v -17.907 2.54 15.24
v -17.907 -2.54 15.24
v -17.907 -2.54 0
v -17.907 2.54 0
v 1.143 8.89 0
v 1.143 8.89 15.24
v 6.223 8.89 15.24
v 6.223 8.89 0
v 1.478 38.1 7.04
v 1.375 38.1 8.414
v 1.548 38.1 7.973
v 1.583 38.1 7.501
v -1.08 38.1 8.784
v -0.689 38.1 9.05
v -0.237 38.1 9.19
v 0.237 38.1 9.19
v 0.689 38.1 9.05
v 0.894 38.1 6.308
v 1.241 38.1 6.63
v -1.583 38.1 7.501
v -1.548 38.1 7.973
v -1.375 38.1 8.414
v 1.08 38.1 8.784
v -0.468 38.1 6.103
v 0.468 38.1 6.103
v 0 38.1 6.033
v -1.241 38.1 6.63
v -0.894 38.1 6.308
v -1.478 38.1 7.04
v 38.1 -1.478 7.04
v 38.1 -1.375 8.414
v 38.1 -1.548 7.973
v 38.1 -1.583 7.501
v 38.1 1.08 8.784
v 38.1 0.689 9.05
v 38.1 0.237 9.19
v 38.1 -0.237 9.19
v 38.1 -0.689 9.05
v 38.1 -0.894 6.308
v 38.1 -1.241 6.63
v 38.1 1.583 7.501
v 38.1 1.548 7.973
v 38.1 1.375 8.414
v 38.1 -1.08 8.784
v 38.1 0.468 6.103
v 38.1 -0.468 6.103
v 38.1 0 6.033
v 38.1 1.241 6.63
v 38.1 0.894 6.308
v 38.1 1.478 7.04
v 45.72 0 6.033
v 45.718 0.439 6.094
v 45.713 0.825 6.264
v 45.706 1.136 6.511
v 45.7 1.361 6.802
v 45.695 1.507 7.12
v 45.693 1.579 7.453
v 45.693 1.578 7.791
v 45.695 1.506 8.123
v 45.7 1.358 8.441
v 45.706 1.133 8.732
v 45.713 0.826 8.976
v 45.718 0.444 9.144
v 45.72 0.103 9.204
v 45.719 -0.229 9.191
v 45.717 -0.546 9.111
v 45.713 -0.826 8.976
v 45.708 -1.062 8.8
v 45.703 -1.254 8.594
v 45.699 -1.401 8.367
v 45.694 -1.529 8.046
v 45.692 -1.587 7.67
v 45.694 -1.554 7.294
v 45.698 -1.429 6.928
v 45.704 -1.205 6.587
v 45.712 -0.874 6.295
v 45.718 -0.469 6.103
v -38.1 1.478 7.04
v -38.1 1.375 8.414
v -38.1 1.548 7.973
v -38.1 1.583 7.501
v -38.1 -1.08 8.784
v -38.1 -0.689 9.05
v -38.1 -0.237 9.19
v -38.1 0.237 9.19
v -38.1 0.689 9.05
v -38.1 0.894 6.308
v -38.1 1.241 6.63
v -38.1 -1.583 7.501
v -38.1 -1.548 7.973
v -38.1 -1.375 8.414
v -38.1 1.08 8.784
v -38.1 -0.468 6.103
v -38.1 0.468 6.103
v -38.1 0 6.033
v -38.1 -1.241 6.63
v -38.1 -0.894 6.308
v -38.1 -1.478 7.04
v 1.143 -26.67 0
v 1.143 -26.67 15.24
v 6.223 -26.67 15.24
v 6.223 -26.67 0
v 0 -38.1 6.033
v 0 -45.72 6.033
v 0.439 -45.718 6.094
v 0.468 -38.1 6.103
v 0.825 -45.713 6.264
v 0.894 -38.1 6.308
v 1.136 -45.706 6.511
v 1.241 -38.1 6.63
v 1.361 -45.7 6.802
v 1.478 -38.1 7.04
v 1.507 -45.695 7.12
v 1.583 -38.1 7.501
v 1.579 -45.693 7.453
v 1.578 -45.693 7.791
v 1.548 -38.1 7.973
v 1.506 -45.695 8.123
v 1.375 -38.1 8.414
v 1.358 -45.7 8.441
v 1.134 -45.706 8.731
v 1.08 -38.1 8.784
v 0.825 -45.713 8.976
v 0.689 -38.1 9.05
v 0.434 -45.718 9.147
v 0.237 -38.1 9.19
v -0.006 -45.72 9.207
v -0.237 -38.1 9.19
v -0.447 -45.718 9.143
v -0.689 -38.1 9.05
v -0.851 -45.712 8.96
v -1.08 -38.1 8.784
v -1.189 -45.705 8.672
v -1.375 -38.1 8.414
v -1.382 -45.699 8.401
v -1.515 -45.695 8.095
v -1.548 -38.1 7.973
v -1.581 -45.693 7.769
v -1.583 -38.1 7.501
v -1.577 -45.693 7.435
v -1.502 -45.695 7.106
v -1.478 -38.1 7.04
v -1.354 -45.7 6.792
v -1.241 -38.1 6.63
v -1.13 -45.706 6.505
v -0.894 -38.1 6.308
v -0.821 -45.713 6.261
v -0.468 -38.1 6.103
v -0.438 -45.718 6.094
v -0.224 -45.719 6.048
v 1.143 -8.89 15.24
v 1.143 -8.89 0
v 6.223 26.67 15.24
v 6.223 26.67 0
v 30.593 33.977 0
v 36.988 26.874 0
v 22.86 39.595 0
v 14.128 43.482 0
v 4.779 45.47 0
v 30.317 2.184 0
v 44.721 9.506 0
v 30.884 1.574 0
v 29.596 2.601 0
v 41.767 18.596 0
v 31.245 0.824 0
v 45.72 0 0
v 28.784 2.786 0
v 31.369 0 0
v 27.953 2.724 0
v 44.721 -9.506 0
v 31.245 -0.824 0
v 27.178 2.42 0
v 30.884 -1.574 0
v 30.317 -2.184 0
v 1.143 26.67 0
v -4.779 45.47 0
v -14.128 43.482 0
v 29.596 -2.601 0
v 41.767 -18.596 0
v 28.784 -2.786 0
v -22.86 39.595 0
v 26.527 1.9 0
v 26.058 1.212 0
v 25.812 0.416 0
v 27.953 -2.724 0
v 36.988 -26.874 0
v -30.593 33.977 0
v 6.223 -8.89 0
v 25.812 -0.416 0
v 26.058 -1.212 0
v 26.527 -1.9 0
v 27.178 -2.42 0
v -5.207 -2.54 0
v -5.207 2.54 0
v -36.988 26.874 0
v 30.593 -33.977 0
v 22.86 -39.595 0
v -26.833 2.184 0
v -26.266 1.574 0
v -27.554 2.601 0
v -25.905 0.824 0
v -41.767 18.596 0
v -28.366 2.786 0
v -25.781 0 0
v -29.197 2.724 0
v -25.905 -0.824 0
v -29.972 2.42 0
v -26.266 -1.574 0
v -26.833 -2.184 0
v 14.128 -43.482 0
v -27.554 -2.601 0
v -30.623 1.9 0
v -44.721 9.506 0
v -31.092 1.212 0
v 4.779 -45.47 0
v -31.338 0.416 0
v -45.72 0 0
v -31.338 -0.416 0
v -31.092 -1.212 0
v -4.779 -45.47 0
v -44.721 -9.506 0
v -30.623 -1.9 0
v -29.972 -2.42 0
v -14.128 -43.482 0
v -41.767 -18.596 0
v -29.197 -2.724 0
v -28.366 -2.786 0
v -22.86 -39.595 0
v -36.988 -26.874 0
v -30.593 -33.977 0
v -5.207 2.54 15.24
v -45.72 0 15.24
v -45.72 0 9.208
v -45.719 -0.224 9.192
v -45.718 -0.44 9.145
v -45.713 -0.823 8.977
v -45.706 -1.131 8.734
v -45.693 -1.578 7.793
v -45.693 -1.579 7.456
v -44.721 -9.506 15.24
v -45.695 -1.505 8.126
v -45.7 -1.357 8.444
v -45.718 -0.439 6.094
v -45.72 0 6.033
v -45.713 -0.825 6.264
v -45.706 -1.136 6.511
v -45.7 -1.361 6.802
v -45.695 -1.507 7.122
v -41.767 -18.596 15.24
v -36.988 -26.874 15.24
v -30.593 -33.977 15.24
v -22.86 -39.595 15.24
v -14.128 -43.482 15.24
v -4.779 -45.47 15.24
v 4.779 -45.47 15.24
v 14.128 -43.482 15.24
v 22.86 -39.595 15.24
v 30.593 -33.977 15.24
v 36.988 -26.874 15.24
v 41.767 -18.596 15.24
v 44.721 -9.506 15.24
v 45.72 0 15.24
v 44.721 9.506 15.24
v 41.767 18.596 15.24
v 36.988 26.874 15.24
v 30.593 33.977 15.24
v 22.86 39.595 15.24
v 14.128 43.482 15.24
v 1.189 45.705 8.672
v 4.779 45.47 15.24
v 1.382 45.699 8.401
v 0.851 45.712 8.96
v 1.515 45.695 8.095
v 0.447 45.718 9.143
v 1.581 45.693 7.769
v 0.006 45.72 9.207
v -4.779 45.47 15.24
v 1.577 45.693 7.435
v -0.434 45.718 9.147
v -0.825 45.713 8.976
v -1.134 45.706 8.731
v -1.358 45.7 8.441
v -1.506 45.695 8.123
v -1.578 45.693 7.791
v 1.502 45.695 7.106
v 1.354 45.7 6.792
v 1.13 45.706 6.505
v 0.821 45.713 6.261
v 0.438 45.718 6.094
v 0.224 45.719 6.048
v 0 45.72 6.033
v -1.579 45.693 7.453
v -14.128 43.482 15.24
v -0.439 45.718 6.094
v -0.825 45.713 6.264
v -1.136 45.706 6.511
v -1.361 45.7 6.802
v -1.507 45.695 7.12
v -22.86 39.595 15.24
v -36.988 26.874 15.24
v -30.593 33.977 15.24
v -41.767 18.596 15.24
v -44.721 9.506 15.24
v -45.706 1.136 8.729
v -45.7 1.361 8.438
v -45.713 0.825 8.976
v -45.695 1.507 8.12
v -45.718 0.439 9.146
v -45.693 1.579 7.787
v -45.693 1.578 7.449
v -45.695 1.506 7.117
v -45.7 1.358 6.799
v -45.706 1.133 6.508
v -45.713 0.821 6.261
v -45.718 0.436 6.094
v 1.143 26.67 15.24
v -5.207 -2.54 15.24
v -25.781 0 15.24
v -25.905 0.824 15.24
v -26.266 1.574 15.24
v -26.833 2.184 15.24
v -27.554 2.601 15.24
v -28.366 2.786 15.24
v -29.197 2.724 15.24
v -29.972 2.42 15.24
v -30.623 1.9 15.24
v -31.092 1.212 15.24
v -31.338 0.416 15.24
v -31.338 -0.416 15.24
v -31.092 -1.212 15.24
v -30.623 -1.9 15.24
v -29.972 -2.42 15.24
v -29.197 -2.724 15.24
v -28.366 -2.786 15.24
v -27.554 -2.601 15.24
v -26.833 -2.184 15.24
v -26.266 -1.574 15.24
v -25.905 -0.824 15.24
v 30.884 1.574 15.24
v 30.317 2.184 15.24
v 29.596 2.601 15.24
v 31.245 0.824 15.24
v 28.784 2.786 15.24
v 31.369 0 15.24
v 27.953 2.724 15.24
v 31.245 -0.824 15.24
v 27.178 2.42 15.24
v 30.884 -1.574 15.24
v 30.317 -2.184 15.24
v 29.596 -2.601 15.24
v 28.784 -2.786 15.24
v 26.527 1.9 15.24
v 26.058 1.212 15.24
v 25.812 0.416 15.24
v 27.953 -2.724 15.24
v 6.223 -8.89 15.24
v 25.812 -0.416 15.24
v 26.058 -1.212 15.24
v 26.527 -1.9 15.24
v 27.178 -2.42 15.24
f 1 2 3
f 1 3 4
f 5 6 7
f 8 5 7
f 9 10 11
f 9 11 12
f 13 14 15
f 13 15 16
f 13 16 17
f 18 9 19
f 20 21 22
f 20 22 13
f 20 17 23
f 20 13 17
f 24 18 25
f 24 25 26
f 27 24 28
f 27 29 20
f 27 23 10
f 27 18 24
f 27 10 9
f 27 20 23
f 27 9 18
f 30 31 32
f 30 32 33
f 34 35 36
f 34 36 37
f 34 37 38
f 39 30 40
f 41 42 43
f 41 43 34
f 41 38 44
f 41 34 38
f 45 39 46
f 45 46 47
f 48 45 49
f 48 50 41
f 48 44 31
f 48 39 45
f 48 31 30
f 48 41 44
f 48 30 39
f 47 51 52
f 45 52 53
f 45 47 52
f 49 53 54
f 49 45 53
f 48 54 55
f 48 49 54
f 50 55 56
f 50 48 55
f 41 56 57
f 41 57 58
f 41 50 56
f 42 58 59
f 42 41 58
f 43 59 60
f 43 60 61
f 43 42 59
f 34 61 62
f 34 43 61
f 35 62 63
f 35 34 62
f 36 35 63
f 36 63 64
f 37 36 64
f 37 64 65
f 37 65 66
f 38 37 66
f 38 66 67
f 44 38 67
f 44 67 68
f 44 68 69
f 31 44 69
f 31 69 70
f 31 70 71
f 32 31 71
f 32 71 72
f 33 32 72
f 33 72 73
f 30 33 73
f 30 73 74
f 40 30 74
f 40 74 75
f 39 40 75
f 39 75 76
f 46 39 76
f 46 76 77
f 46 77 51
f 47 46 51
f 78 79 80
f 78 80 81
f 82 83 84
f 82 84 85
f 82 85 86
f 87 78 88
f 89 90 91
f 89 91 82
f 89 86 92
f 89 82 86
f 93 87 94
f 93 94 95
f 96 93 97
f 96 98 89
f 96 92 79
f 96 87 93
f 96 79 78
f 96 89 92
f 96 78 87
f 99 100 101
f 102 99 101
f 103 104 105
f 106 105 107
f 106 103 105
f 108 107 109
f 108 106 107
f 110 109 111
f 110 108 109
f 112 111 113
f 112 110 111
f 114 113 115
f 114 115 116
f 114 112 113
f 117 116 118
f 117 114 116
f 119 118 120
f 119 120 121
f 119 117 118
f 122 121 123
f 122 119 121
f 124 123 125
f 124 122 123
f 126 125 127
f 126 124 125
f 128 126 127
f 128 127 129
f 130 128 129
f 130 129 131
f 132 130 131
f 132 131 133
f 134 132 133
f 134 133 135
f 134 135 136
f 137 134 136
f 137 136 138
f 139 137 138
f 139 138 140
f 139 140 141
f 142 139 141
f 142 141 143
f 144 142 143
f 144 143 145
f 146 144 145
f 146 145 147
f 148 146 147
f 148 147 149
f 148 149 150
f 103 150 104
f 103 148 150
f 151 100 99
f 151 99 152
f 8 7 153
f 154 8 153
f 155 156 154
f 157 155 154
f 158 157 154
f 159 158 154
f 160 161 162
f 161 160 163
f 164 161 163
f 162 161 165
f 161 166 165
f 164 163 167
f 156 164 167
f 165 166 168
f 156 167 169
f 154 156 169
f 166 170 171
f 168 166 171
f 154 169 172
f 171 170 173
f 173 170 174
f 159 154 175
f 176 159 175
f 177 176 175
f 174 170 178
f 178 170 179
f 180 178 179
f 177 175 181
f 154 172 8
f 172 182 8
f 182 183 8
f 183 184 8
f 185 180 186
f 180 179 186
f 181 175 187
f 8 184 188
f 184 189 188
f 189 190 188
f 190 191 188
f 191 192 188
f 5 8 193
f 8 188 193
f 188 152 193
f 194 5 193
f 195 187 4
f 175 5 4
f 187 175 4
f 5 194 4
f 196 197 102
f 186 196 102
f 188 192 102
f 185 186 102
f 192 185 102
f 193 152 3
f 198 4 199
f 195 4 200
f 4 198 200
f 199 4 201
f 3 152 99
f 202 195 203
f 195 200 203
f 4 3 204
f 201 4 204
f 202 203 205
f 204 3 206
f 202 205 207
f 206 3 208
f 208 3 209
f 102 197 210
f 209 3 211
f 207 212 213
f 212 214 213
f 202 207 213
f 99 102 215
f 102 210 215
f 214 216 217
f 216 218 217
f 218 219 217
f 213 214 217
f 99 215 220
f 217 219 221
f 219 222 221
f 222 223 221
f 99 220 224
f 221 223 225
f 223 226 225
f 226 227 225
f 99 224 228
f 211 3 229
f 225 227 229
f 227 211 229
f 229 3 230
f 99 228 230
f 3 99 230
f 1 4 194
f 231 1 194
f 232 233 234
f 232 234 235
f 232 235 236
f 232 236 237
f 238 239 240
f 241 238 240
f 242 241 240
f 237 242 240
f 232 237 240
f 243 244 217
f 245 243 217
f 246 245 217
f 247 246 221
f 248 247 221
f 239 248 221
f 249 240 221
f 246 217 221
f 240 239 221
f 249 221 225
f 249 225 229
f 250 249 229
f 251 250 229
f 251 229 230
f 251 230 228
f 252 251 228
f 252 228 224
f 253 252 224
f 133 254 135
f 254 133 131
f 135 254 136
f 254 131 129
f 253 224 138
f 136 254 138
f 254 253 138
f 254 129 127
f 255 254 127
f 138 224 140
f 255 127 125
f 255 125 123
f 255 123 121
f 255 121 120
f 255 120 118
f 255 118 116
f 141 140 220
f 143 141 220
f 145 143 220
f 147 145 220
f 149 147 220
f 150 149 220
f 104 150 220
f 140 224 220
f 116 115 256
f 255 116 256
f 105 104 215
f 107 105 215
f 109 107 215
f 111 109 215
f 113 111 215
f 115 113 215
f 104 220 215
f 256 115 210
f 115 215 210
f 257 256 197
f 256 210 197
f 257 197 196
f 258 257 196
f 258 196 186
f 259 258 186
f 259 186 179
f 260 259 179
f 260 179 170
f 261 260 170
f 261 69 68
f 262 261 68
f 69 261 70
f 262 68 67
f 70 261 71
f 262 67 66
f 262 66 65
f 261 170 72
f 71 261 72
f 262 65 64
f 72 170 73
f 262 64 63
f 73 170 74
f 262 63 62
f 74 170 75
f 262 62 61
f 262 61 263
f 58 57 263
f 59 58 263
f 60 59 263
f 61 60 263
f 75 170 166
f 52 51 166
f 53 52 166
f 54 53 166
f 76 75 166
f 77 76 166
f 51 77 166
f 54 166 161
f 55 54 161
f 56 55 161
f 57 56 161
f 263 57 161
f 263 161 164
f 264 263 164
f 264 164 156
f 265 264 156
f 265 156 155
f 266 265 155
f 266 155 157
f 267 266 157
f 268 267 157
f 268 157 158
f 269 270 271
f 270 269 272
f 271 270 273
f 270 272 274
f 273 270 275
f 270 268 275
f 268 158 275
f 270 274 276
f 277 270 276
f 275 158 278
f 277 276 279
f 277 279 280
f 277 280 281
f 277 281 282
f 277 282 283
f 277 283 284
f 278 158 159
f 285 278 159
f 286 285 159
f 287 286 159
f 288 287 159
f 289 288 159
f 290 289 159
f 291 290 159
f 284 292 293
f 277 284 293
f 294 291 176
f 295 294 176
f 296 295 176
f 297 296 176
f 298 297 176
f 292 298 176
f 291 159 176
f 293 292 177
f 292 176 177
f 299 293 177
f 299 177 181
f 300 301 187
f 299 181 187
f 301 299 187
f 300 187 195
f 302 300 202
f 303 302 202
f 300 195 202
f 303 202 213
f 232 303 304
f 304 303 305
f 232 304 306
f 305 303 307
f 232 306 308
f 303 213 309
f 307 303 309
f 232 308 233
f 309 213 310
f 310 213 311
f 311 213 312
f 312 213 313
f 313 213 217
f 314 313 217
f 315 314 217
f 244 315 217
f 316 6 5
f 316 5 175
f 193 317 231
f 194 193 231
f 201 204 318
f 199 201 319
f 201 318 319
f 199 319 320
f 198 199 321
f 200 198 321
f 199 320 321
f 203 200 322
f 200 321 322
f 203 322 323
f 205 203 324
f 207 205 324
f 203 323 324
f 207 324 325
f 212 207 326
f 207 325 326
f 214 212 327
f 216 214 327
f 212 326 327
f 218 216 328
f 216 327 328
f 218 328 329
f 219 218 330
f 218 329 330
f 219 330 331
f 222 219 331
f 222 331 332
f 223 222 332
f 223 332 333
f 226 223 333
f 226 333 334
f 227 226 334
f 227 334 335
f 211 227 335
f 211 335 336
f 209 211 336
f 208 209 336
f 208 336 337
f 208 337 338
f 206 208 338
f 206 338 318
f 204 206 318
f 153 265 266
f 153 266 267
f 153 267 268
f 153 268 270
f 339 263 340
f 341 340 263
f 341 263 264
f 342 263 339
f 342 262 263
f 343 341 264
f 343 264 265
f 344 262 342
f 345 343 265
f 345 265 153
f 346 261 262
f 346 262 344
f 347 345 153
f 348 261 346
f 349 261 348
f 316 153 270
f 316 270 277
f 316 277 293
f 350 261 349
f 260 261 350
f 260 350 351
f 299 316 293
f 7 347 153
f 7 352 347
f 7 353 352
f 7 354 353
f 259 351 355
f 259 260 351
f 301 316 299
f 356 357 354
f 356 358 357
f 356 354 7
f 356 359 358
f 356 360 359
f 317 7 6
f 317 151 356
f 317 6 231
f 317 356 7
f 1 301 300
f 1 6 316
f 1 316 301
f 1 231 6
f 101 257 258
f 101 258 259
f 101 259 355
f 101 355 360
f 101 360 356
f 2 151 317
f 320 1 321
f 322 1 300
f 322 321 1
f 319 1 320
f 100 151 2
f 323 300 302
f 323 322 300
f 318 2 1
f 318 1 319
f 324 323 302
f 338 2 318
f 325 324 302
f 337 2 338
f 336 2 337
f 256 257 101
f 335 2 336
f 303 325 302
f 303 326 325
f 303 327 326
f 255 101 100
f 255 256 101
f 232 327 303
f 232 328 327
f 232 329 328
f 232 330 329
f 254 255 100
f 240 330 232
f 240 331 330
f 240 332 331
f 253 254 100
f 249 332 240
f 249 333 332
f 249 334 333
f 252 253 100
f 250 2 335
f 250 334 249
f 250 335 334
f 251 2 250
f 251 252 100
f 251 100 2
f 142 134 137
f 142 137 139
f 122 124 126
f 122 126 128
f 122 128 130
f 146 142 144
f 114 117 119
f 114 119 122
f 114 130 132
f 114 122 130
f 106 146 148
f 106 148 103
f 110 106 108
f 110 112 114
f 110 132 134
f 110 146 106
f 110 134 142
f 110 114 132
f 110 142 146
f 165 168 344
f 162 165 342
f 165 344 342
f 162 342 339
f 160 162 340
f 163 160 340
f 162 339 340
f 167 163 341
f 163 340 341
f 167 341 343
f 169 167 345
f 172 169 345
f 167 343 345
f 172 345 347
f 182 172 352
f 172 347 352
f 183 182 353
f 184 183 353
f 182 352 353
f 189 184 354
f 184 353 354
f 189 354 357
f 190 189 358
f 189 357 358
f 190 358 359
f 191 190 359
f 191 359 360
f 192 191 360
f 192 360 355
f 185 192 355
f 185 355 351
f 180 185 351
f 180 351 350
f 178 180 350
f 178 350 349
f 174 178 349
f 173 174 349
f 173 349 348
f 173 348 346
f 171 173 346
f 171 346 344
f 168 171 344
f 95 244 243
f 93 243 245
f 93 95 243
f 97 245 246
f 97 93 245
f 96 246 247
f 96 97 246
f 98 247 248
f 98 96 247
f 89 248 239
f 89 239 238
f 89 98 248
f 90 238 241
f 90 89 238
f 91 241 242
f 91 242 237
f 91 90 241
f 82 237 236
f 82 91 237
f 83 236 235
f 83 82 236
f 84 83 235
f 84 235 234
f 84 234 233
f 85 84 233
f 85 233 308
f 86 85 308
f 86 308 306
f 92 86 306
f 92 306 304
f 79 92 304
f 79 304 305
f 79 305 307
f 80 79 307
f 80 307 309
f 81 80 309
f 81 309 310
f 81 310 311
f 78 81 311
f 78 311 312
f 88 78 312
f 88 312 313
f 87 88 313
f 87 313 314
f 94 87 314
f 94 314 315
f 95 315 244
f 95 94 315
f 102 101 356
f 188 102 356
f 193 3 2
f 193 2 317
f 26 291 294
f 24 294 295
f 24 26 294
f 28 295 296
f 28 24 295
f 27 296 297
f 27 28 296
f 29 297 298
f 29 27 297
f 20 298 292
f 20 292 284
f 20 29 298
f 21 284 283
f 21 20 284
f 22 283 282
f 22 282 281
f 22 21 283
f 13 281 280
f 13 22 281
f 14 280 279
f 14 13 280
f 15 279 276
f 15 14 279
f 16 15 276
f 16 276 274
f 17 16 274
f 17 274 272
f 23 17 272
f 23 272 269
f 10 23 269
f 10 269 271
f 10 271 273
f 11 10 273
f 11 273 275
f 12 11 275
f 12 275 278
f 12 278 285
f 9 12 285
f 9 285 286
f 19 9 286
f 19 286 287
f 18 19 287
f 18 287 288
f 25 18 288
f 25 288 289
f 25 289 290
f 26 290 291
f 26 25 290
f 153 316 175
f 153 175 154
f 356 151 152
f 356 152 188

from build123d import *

# Parameters (mm, degrees)
SKETCH1_R           = 45.72
BOSS_EXTRUDE1_DEPTH = 15.24
SKETCH2_R           = 2.794
CUT_EXTRUDE1_DEPTH  = 67.4296199
CUT_EXTRUDE2_START  = 38.1
SKETCH3_R           = 1.5875
CUT_EXTRUDE2_DEPTH  = 15.24
CIRPATTERN1_COUNT   = 4
SKETCH4_W           = 5.08
SKETCH4_H           = 17.78
SKETCH4_W_2         = 12.7
SKETCH4_H_2         = 5.08
CUT_EXTRUDE3_DEPTH  = 67.429620068


with BuildPart() as part:
    # Sketch1 → Boss-Extrude1 (new body)
    with BuildSketch(Plane.XY):
        Circle(SKETCH1_R)
    extrude(amount=BOSS_EXTRUDE1_DEPTH)

    # Sketch2 → Cut-Extrude1 (cut, through all)
    with BuildSketch(Plane.XY.offset(15.24)):
        with Locations((-28.575, 0)):
            Circle(SKETCH2_R)
        with Locations((28.575, 0)):
            Circle(SKETCH2_R)
    extrude(amount=-CUT_EXTRUDE1_DEPTH, mode=Mode.SUBTRACT)

    # Sketch3 → Cut-Extrude2 (cut)
    with BuildSketch(Plane(origin=(0, 0, 0), x_dir=(1, 0, 0), z_dir=(0, 1, 0)).offset(CUT_EXTRUDE2_START)):
        with Locations((0, -7.62)):
            Circle(SKETCH3_R)
    cut_extrude2 = extrude(amount=CUT_EXTRUDE2_DEPTH, mode=Mode.SUBTRACT)

    # CirPattern1: Cut-Extrude2 ×4 about axis
    cirpattern1_axis = Axis((0, 0, 15.24), (0, 0, -1))
    for i in range(1, CIRPATTERN1_COUNT):
        add(cut_extrude2.rotate(cirpattern1_axis, i * 360 / CIRPATTERN1_COUNT), mode=Mode.SUBTRACT)

    # Sketch4 → Cut-Extrude3 (cut, through all)
    with BuildSketch(Plane.XY.offset(15.24)):
        with Locations((3.682680903, 17.78)):
            Rectangle(SKETCH4_W, SKETCH4_H)
        with Locations((3.682680903, -17.78)):
            Rectangle(SKETCH4_W, SKETCH4_H)
        with Locations((-11.557319097, 0)):
            Rectangle(SKETCH4_W_2, SKETCH4_H_2)
    extrude(amount=-CUT_EXTRUDE3_DEPTH, mode=Mode.SUBTRACT)


solid = part.part
